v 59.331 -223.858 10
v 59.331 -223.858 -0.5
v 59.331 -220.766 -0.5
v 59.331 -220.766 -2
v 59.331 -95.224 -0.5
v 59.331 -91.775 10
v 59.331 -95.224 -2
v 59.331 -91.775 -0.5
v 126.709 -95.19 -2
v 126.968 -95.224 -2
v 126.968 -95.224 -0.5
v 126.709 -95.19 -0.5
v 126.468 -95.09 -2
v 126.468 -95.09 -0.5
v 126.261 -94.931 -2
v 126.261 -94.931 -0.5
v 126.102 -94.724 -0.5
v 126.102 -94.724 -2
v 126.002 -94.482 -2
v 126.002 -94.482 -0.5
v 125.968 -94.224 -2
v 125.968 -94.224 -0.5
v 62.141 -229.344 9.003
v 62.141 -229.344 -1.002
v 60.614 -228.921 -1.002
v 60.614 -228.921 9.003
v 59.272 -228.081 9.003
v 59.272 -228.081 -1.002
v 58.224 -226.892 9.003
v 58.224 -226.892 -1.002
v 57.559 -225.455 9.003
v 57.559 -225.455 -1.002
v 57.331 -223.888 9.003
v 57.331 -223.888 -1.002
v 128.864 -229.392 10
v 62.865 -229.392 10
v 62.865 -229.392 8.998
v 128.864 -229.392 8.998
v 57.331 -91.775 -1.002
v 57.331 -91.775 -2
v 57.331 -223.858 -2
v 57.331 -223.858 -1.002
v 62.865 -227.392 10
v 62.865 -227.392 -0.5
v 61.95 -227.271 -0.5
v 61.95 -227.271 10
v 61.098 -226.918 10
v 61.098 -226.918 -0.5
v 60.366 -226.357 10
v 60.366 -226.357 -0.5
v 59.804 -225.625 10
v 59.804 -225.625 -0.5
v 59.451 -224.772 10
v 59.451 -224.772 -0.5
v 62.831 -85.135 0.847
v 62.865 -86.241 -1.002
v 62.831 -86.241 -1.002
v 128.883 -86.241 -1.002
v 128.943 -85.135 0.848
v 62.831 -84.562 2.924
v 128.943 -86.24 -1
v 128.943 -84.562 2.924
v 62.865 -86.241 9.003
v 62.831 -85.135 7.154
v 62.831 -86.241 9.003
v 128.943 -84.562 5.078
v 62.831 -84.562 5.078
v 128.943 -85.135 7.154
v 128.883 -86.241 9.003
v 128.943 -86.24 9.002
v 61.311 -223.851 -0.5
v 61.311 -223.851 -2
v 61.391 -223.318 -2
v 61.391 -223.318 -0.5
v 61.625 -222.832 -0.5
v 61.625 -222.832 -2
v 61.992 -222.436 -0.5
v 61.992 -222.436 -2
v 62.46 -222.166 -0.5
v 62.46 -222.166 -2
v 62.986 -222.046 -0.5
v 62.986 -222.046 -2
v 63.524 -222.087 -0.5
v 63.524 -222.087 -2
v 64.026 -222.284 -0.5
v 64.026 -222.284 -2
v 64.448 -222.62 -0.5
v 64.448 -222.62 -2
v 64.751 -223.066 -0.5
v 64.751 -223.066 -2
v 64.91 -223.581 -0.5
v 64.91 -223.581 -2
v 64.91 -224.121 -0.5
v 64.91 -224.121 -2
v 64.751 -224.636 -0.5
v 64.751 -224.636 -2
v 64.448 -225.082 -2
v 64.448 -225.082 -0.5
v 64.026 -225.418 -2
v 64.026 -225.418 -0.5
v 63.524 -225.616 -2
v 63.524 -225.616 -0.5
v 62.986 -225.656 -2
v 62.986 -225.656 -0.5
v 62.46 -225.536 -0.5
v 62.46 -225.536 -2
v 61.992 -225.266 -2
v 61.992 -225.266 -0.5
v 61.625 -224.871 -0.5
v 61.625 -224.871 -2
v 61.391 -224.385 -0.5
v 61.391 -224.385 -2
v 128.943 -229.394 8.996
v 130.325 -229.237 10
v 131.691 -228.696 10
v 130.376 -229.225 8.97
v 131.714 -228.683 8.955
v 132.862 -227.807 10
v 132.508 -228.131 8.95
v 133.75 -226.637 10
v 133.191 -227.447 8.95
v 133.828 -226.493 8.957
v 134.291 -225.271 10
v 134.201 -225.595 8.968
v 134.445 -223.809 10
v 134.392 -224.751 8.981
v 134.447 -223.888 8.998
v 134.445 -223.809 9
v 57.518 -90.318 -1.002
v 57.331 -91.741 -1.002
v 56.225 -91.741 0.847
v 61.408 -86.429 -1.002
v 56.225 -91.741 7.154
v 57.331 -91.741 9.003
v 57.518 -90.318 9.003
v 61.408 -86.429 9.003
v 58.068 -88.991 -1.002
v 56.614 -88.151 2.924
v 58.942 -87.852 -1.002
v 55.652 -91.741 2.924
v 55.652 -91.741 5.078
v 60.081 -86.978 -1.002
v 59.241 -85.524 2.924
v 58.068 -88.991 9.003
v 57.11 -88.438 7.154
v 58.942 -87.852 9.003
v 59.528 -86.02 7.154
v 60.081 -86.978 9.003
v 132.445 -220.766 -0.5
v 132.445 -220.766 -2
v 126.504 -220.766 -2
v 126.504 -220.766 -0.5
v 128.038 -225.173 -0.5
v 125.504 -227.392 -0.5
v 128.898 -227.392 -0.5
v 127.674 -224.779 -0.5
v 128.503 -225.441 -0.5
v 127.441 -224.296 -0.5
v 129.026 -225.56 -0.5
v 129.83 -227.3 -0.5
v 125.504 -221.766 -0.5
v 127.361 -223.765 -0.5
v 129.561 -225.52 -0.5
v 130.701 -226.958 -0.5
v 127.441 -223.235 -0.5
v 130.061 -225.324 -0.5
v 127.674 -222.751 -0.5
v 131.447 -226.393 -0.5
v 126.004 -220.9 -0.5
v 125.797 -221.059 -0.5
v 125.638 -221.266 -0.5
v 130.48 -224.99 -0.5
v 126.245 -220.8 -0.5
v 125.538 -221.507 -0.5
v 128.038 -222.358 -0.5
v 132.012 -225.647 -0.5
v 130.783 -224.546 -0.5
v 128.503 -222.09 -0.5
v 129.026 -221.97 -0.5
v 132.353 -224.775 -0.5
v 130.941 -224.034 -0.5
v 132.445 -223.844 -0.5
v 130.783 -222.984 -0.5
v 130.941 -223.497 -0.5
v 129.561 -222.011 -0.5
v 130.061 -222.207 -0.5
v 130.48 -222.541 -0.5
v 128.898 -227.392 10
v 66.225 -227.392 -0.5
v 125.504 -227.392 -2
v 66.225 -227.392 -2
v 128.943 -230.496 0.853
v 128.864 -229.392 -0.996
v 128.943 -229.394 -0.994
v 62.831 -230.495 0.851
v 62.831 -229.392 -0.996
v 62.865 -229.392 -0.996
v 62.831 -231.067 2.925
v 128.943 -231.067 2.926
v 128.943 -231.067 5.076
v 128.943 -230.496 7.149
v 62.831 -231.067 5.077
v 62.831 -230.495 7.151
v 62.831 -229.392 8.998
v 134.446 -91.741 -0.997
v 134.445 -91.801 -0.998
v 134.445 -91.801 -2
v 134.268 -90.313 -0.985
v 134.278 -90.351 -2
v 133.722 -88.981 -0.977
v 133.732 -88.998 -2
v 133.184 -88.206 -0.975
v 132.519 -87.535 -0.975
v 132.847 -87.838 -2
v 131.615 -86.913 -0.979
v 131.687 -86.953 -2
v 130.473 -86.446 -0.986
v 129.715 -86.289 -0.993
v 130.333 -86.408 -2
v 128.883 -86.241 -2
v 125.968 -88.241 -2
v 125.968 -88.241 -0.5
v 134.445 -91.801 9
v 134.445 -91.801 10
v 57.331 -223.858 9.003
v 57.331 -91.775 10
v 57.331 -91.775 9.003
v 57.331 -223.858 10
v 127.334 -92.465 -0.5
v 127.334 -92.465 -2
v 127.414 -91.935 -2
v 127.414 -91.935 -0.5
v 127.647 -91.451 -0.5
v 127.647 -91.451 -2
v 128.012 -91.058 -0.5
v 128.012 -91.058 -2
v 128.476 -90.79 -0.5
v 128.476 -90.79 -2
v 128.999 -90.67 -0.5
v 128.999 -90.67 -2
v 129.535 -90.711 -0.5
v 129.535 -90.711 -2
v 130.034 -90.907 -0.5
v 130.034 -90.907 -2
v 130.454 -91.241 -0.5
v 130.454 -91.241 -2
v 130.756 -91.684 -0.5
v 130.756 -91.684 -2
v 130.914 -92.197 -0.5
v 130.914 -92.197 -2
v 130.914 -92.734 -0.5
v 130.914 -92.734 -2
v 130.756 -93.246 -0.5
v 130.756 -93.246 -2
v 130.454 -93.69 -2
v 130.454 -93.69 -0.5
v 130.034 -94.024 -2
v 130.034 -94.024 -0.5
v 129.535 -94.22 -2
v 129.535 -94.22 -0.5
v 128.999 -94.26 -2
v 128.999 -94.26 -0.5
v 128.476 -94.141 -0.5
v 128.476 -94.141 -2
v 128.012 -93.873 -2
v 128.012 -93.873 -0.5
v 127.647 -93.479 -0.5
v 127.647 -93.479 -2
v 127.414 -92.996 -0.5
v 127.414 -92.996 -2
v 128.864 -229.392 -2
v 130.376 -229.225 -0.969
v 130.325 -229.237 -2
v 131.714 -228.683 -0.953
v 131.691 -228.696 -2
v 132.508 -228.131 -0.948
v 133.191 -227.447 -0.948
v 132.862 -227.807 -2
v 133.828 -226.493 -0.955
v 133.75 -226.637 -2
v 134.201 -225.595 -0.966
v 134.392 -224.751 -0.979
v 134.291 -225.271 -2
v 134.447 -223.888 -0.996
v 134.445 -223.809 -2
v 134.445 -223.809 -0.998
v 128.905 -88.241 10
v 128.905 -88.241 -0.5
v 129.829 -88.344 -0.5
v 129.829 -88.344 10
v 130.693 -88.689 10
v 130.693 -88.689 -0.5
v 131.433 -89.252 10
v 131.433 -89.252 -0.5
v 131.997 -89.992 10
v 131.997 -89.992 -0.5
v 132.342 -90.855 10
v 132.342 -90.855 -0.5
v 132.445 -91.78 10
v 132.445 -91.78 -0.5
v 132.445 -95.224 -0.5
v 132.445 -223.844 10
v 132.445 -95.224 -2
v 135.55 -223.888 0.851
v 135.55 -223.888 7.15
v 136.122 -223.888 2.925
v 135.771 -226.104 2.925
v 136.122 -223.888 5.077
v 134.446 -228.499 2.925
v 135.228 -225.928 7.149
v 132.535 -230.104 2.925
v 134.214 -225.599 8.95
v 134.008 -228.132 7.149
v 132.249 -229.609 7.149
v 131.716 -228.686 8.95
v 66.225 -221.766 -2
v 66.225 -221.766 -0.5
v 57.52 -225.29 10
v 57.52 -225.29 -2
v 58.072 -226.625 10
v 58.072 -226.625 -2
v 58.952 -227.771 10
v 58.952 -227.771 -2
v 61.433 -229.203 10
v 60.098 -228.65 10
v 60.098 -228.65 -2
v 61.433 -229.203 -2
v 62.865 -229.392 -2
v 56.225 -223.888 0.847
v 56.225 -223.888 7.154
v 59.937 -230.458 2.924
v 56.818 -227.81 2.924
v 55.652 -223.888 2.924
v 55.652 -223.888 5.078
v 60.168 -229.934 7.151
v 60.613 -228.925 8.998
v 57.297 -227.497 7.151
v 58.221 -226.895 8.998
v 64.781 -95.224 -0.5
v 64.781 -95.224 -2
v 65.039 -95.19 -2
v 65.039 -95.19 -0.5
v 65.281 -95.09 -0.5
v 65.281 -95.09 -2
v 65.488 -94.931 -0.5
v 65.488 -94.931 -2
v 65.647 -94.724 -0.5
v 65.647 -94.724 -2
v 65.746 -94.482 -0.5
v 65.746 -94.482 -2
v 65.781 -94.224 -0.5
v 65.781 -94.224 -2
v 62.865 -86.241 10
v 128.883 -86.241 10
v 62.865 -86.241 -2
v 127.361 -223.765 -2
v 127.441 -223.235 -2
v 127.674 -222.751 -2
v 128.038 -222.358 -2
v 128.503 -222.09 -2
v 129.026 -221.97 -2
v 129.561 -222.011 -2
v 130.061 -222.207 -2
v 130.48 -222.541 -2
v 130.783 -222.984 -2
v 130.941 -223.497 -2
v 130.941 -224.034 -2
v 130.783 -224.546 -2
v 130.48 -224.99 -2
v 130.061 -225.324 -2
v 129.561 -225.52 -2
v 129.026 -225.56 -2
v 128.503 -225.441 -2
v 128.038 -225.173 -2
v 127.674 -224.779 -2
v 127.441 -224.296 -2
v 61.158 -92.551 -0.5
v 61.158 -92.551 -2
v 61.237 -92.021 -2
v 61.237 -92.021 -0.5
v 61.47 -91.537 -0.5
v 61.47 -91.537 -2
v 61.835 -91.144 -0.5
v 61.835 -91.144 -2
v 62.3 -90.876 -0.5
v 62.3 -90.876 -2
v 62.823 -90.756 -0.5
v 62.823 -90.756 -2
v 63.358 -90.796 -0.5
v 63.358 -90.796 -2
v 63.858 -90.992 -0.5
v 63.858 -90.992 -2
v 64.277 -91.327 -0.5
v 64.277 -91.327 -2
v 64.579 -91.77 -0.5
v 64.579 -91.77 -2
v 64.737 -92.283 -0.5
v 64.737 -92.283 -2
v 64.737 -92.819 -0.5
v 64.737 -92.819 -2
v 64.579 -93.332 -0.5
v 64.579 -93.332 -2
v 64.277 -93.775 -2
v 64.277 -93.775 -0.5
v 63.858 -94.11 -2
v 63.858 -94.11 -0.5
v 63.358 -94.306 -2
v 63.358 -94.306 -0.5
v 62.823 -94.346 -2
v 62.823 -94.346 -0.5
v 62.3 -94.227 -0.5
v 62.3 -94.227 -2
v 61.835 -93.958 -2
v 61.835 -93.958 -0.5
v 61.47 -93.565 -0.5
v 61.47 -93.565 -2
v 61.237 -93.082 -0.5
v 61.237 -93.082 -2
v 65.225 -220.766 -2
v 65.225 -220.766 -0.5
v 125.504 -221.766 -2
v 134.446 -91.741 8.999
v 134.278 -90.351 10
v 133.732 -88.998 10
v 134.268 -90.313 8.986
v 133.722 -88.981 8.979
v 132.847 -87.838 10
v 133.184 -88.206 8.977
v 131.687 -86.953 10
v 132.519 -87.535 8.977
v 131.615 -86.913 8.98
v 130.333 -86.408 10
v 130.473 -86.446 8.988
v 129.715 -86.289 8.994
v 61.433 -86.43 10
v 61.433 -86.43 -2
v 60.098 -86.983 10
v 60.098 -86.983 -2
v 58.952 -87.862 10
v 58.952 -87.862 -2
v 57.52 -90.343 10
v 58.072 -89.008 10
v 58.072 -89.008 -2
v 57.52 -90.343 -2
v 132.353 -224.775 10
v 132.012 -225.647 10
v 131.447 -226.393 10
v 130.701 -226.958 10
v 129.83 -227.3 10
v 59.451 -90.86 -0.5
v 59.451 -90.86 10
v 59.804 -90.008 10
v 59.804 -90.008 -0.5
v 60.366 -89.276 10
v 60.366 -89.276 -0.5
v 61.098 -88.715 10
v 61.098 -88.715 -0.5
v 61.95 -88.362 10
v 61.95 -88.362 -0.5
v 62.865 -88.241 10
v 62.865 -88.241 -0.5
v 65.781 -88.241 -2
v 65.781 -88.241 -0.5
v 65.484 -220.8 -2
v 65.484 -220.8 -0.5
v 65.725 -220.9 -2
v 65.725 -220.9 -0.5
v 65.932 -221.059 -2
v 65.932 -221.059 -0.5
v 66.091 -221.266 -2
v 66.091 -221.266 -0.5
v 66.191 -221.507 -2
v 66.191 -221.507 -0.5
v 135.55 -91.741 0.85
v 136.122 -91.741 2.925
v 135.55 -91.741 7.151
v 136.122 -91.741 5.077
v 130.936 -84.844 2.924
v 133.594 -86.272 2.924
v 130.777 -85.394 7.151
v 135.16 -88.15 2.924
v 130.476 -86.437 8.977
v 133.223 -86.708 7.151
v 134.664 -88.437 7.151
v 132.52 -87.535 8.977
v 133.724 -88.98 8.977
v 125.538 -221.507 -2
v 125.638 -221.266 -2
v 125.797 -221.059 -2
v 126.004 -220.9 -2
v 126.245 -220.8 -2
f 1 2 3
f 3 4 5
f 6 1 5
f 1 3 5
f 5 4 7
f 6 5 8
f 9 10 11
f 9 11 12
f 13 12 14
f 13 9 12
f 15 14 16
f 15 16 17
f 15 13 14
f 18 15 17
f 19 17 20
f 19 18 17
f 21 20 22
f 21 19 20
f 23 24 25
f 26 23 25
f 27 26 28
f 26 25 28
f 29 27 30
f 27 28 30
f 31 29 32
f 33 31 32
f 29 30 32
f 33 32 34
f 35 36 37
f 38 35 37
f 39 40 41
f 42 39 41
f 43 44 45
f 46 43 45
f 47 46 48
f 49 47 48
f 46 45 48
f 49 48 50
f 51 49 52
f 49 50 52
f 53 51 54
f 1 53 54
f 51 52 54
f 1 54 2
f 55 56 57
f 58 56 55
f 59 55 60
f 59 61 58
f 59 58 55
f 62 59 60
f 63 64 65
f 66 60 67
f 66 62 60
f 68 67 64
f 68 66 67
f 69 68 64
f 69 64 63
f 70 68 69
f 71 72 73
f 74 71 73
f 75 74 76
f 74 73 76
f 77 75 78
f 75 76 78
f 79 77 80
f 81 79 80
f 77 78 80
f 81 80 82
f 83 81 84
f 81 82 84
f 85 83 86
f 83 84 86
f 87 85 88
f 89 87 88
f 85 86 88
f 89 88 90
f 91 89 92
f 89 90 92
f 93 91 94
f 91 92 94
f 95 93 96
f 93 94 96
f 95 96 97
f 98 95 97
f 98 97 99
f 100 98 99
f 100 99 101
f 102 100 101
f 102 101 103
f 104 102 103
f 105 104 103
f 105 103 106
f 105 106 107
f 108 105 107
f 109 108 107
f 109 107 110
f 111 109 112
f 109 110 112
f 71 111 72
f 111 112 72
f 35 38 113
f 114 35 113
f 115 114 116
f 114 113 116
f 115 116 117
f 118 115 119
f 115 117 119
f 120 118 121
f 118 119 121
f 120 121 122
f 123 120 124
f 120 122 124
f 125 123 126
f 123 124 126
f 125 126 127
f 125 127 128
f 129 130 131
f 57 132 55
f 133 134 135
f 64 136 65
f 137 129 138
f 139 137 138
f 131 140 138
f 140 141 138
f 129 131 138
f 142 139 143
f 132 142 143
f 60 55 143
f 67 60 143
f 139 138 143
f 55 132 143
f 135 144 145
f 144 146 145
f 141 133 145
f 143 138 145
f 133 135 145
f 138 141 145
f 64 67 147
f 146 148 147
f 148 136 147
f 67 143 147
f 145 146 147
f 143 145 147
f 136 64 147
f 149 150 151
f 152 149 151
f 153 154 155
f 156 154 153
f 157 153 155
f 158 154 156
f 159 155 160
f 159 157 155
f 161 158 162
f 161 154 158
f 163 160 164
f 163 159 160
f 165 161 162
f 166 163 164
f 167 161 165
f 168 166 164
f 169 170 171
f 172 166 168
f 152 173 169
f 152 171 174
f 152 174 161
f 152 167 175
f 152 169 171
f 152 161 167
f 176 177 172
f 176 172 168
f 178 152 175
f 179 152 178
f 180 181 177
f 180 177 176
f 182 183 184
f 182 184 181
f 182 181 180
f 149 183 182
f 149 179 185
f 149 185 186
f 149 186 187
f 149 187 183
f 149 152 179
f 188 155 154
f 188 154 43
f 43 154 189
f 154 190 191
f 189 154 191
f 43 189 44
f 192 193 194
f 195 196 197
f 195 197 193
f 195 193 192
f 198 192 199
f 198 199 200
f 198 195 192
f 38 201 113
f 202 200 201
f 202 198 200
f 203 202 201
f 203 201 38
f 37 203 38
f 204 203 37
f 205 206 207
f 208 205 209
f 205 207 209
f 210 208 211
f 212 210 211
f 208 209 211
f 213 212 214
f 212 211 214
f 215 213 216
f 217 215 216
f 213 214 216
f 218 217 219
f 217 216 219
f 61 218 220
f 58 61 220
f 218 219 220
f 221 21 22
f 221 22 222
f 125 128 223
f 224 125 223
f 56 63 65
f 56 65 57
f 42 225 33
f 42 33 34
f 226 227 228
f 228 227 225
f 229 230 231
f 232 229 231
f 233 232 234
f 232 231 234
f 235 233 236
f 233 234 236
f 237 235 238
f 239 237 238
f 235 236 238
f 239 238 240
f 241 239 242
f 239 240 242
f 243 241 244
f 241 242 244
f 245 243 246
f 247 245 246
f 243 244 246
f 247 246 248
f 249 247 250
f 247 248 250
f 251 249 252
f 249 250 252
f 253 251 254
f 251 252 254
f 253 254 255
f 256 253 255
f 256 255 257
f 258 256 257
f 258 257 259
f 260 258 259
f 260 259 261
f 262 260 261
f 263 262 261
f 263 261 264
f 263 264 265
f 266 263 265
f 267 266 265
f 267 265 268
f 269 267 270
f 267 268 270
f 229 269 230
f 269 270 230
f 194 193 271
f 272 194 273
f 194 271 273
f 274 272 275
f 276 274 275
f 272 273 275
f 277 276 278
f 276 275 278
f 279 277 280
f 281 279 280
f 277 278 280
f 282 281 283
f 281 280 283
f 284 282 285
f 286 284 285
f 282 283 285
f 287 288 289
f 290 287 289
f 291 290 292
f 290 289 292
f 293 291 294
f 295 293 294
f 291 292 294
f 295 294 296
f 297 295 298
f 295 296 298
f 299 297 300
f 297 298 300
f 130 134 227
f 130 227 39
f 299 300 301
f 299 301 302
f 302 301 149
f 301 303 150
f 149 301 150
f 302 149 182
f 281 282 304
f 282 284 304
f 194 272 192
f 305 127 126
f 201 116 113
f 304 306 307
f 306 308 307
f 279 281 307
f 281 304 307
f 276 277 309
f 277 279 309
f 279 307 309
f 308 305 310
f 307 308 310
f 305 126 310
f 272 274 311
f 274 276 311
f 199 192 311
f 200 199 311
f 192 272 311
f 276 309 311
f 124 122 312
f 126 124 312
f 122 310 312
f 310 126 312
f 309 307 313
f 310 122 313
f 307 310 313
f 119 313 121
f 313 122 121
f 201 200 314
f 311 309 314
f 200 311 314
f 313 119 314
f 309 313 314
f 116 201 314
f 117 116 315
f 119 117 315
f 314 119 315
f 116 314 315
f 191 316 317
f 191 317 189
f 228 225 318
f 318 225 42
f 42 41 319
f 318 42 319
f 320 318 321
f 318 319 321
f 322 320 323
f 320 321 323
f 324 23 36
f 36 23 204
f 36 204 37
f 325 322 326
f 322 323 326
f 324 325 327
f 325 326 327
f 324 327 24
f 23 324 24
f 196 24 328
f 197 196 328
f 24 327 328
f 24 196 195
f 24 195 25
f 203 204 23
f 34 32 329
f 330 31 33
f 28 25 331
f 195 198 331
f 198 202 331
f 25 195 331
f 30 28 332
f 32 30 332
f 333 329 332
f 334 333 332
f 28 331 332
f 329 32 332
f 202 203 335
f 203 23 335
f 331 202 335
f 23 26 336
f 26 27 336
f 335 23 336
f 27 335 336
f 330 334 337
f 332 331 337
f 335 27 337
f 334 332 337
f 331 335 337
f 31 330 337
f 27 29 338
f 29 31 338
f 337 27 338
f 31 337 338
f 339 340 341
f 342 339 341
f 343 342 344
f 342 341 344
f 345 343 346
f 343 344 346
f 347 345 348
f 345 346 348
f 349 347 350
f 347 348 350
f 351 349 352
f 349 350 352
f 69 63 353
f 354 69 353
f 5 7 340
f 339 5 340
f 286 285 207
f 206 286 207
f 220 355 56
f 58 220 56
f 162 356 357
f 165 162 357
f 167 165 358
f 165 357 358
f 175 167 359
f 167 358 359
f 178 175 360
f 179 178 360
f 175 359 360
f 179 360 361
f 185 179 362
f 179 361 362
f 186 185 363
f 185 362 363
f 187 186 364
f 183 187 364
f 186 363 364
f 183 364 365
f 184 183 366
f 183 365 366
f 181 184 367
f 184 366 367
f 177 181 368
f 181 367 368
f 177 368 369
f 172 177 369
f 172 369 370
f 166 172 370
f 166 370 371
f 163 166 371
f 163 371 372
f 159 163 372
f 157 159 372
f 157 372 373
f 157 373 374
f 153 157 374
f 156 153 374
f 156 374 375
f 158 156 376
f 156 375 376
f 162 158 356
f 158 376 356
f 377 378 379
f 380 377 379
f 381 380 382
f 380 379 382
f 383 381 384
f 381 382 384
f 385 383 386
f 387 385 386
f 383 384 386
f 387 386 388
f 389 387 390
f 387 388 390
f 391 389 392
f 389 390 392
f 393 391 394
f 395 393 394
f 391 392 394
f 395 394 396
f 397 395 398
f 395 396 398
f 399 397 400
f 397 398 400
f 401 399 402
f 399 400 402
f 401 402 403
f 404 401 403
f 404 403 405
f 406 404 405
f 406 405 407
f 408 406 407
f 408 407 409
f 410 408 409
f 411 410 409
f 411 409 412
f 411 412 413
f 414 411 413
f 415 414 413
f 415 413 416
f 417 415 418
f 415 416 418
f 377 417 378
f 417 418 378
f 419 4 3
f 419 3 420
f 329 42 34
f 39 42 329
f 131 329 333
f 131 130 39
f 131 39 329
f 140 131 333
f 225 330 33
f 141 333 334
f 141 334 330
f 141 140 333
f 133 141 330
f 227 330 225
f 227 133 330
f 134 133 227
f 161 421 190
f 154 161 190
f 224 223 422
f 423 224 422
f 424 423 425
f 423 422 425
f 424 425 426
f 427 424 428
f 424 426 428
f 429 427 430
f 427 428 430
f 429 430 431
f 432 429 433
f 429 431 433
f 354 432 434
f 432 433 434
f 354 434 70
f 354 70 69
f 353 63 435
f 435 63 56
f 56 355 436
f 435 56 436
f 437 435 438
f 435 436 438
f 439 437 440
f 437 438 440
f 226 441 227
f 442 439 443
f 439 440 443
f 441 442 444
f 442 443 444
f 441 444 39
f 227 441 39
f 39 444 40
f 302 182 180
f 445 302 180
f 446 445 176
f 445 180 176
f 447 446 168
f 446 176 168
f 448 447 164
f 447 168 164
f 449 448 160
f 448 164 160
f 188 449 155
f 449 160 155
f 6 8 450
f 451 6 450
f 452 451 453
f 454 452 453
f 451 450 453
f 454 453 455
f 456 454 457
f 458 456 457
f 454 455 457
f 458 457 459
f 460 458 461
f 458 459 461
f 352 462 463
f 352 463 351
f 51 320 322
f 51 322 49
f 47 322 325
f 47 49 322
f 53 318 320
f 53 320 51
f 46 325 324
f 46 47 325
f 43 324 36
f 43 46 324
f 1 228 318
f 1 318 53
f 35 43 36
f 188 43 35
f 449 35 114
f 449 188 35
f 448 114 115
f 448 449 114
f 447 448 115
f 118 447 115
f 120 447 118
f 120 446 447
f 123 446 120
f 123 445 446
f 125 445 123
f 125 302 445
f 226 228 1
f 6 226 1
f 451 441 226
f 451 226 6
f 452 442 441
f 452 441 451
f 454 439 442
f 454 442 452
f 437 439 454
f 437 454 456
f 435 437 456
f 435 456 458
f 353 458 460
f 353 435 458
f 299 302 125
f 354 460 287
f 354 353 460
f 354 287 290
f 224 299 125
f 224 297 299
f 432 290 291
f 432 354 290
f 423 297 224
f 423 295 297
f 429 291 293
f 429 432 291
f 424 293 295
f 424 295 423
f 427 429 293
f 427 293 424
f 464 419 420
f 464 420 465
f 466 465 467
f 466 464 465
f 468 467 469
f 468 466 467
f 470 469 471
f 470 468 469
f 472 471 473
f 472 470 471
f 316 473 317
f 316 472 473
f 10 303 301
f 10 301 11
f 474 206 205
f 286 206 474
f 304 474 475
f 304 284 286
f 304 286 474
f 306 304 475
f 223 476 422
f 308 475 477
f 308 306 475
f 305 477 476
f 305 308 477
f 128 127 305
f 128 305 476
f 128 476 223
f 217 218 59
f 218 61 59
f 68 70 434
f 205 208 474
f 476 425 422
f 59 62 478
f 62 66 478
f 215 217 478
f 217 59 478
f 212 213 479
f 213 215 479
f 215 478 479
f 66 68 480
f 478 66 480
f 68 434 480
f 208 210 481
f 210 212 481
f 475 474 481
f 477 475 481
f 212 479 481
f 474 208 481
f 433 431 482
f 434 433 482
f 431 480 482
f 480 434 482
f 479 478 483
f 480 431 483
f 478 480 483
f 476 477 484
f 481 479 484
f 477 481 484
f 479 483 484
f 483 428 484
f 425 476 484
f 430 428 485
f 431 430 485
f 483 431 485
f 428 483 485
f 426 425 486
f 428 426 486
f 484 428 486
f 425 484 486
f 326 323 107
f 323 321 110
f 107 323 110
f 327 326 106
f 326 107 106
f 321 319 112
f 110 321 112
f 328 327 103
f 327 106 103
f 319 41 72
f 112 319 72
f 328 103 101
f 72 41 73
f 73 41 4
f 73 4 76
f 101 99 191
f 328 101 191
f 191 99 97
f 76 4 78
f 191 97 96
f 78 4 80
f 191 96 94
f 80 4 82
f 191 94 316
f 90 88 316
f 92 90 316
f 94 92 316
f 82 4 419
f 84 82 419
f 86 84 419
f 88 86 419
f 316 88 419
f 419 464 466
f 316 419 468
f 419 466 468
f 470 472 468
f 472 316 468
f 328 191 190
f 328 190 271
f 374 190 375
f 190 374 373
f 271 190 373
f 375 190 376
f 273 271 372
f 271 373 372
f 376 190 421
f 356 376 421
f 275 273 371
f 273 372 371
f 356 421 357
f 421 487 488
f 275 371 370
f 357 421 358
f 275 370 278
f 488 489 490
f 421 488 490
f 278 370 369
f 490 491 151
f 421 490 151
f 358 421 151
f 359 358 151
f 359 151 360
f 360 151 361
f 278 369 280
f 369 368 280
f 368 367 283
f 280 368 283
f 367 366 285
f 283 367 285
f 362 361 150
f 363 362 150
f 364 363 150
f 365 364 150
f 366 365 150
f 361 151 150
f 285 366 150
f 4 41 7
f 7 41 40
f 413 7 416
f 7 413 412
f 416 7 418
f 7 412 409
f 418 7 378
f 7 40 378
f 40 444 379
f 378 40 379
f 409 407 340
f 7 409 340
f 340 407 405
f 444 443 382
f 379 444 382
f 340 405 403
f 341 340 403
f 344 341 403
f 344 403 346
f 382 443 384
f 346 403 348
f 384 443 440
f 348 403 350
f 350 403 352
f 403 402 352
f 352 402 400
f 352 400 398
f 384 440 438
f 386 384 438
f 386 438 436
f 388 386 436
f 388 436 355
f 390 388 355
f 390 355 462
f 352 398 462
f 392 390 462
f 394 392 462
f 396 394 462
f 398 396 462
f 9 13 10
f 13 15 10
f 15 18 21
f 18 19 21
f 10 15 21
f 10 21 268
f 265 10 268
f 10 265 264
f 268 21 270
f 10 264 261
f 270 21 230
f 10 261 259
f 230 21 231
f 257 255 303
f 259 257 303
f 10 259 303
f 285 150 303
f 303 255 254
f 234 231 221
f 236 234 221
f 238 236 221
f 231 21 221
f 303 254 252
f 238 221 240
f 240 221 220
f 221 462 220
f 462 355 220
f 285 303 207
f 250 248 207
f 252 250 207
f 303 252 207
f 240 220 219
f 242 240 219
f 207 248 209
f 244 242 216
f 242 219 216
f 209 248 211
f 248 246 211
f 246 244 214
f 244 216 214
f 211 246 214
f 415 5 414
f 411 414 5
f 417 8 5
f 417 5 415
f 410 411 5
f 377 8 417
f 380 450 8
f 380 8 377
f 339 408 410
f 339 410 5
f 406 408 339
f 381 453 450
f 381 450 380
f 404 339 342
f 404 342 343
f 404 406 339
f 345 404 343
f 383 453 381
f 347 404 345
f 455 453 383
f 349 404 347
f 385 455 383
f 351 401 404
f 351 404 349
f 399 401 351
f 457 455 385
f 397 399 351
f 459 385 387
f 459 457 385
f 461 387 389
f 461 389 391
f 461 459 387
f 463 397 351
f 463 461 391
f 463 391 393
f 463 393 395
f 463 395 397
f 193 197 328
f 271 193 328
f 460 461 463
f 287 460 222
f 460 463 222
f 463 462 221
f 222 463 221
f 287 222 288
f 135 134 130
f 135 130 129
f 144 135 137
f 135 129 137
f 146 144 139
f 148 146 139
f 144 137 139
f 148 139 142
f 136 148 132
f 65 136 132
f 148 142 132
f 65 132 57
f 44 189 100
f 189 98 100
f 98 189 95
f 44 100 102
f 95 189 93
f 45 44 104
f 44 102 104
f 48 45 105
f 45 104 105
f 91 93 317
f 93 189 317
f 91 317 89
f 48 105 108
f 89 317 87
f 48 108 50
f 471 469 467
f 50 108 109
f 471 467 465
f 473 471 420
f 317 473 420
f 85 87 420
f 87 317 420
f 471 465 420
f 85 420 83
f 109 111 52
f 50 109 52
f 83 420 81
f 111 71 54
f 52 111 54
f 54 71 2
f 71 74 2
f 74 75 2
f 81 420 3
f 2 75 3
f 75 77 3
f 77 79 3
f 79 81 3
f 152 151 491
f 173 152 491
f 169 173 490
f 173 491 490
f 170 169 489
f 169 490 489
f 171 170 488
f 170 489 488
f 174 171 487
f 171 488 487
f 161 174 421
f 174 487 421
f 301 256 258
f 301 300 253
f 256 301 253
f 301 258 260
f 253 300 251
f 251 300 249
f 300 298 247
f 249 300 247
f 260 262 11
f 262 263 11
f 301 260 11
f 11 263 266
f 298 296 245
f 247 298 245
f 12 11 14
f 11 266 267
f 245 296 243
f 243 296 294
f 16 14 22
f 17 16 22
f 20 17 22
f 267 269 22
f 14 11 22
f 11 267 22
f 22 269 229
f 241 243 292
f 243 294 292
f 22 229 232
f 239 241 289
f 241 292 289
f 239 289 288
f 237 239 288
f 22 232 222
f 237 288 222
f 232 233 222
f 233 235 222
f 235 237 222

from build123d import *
from build123d.topology import SkipClean

# Parameters (mm, degrees)
BOSS_EXTRU_1_DEPTH      = 10
COQUE3_START            = 62.865
COQUE3_OUTLINE_W        = 139.150614233
COQUE3_OUTLINE_H        = 10
COQUE3_DEPTH            = 66.018297978
COQUE3_2_DEPTH          = 66.018297978
COQUE3_START_2          = 132.445419336
COQUE3_3_OUTLINE_W      = 139.150614233
COQUE3_3_OUTLINE_H      = 10
COQUE3_3_DEPTH          = 0.002588282
COQUE3_4_DEPTH          = 10
COQUE3_START_3          = -2
COQUE3_5_DEPTH          = 12
COQUE3_6_DEPTH          = 2
ENL_V_START             = -10
ENL_V_MAT_EXTRU_4_DEPTH = 10
ESQUISSE5_R             = 1.8
BOSS_EXTRU_2_DEPTH      = 1.5
ESQUISSE6_R             = 1.8
ESQUISSE6_R_2           = 1.809836942
BOSS_EXTRU_3_DEPTH      = 1.5


with BuildPart() as part:
    # Model → Boss.-Extru.1 (new body)
    with BuildSketch(Plane.XY):
        with BuildLine():
            Line((62.865, -88.241118767), (128.905, -88.241118767))
            ThreePointArc((128.905, -88.241118767), (131.433274754, -89.251885129), (132.445419336, -91.779608456))
            Line((132.445419336, -91.779608456), (132.445419336, -223.843779))
            ThreePointArc((132.445419336, -223.843779), (131.447277728, -226.393080044), (128.898176953, -227.391733))
            Line((128.898176953, -227.391733), (62.865, -227.391733))
            ThreePointArc((62.865, -227.391733), (60.366111032, -226.356659298), (59.33103733, -223.85777033))
            Line((59.33103733, -223.85777033), (59.33103733, -91.775081437))
            ThreePointArc((59.33103733, -91.775081437), (60.366111032, -89.276192468), (62.865, -88.241118767))
        make_face()
    extrude(amount=BOSS_EXTRU_1_DEPTH)

    # Coque3: read off the stored shape, not the designer's step
    # Coque3 outline → Coque3 (cut)
    with BuildSketch(Plane.YZ.offset(COQUE3_START)):
        with Locations((-157.816425884, 5)):
            Rectangle(COQUE3_OUTLINE_W, COQUE3_OUTLINE_H)
    extrude(amount=COQUE3_DEPTH, mode=Mode.SUBTRACT)

    # Coque3 2 outline → Coque3 2 (add)
    with BuildSketch(Plane.YZ.offset(COQUE3_START)):
        Polygon((-227.391733, 10), (-229.391733, 10), (-229.391733, -2), (-86.241118767, -2), (-86.241118767, 10), (-88.241118767, 10), (-88.241118767, 0), (-227.391733, 0), align=None)
    extrude(amount=COQUE3_2_DEPTH)

    # Coque3 3 outline → Coque3 3 (add)
    with BuildSketch(Plane.YZ.offset(COQUE3_START_2)):
        with Locations((-157.816425884, 5)):
            Rectangle(COQUE3_3_OUTLINE_W, COQUE3_3_OUTLINE_H)
    extrude(amount=COQUE3_3_DEPTH)

    # Coque3 4 outline → Coque3 4 (cut)
    with BuildSketch(Plane.XY):
        with BuildLine():
            Line((62.865, -227.391733), (62.865, -88.241118767))
            ThreePointArc((62.865, -88.241118767), (60.366111032, -89.276192468), (59.33103733, -91.775081437))
            Line((59.33103733, -91.775081437), (59.33103733, -223.85777033))
            ThreePointArc((59.33103733, -223.85777033), (60.366111032, -226.356659298), (62.865, -227.391733))
        make_face()
        with BuildLine():
            Line((128.905, -88.241118767), (128.883297978, -88.241118767))
            Line((128.883297978, -88.241118767), (128.883297978, -227.391733))
            Line((128.883297978, -227.391733), (128.898176953, -227.391733))
            ThreePointArc((128.898176953, -227.391733), (131.447277728, -226.393080044), (132.445419336, -223.843779))
            Line((132.445419336, -223.843779), (132.445419336, -91.779608456))
            ThreePointArc((132.445419336, -91.779608456), (131.433274754, -89.251885129), (128.905, -88.241118767))
        make_face()
    extrude(amount=COQUE3_4_DEPTH, mode=Mode.SUBTRACT)

    # Coque3 5 outline → Coque3 5 (add)
    with SkipClean():  # the faces are left unmerged after this step: merging them gives an invalid solid
        with BuildSketch(Plane.XY.offset(COQUE3_START_3)):
            with BuildLine():
                ThreePointArc((62.865, -86.241118767), (58.951897469, -87.861978906), (57.33103733, -91.775081437))
                Line((57.33103733, -91.775081437), (57.33103733, -223.85777033))
                ThreePointArc((57.33103733, -223.85777033), (58.951897469, -227.770872861), (62.865, -229.391733))
                Line((62.865, -229.391733), (62.865, -227.391733))
                ThreePointArc((62.865, -227.391733), (60.366111032, -226.356659298), (59.33103733, -223.85777033))
                Line((59.33103733, -223.85777033), (59.33103733, -91.775081437))
                ThreePointArc((59.33103733, -91.775081437), (60.366111032, -89.276192468), (62.865, -88.241118767))
                Line((62.865, -88.241118767), (62.865, -86.241118767))
            make_face()
            with BuildLine():
                Line((128.883297978, -86.241118767), (128.883297978, -88.241118767))
                Line((128.883297978, -88.241118767), (128.905, -88.241118767))
                ThreePointArc((128.905, -88.241118767), (131.433274754, -89.251885129), (132.445419336, -91.779608456))
                Line((132.445419336, -91.779608456), (132.445419336, -223.843779))
                ThreePointArc((132.445419336, -223.843779), (131.447277728, -226.393080044), (128.898176953, -227.391733))
                Line((128.898176953, -227.391733), (128.883297978, -227.391733))
                Line((128.883297978, -227.391733), (128.883297978, -229.391733))
                Line((128.883297978, -229.391733), (128.863893168, -229.391733))
                ThreePointArc((128.863893168, -229.391733), (132.861554056, -227.807230841), (134.445419336, -223.80931758))
                Line((134.445419336, -223.80931758), (134.445419336, -91.8008272))
                ThreePointArc((134.445419336, -91.8008272), (132.847317492, -87.837500742), (128.883297978, -86.241118767))
            make_face()
        extrude(amount=COQUE3_5_DEPTH)
    add(part.part.scale(1), mode=Mode.REPLACE)  # the faces are merged on a copy

    # Coque3 6 outline → Coque3 6 (add)
    with BuildSketch(Plane.XY.offset(COQUE3_START_3)):
        with BuildLine():
            Line((62.865, -227.391733), (62.865, -88.241118767))
            ThreePointArc((62.865, -88.241118767), (60.366111032, -89.276192468), (59.33103733, -91.775081437))
            Line((59.33103733, -91.775081437), (59.33103733, -223.85777033))
            ThreePointArc((59.33103733, -223.85777033), (60.366111032, -226.356659298), (62.865, -227.391733))
        make_face()
        with BuildLine():
            Line((128.905, -88.241118767), (128.883297978, -88.241118767))
            Line((128.883297978, -88.241118767), (128.883297978, -227.391733))
            Line((128.883297978, -227.391733), (128.898176953, -227.391733))
            ThreePointArc((128.898176953, -227.391733), (131.447277728, -226.393080044), (132.445419336, -223.843779))
            Line((132.445419336, -223.843779), (132.445419336, -91.779608456))
            ThreePointArc((132.445419336, -91.779608456), (131.433274754, -89.251885129), (128.905, -88.241118767))
        make_face()
    extrude(amount=COQUE3_6_DEPTH)

    # Esquisse3 → Enlèv. mat.-Extru.4 (cut)
    with BuildSketch(Plane.XY.offset(ENL_V_START)):
        with BuildLine():
            Line((62.865, -88.241118767), (128.905, -88.241118767))
            ThreePointArc((128.905, -88.241118767), (131.433274754, -89.251885129), (132.445419336, -91.779608456))
            Line((132.445419336, -91.779608456), (132.445419336, -223.843779))
            ThreePointArc((132.445419336, -223.843779), (131.447277728, -226.393080044), (128.898176953, -227.391733))
            Line((128.898176953, -227.391733), (62.865, -227.391733))
            ThreePointArc((62.865, -227.391733), (60.366111032, -226.356659298), (59.33103733, -223.85777033))
            Line((59.33103733, -223.85777033), (59.33103733, -91.775081437))
            ThreePointArc((59.33103733, -91.775081437), (60.366111032, -89.276192468), (62.865, -88.241118767))
        make_face()
    extrude(amount=ENL_V_MAT_EXTRU_4_DEPTH, mode=Mode.SUBTRACT)

    # Esquisse5 → Boss.-Extru.2 (add)
    # profile 1 of 2: a face of its own
    with SkipClean():  # the faces are left unmerged after this step: merging them gives an invalid solid
        with BuildSketch(Plane(origin=(0, 0, -2), x_dir=(-1, 0, 0), z_dir=(0, 0, -1))):
            with BuildLine():
                Line((-125.967795303, -88.736416121), (-125.967795303, -87.927030419))
                Line((-125.967795303, -87.927030419), (-130.489542498, -87.7228715))
                Line((-130.489542498, -87.7228715), (-132.246258772, -88.33172327))
                Line((-132.246258772, -88.33172327), (-132.913956121, -88.736416121))
                Line((-132.913956121, -88.736416121), (-132.913956121, -95.223579528))
                Line((-132.913956121, -95.223579528), (-126.967795303, -95.223579528))
                ThreePointArc((-126.967795303, -95.223579528), (-126.260688522, -94.93068631), (-125.967795303, -94.223579528))
                Line((-125.967795303, -94.223579528), (-125.967795303, -88.736416121))
            make_face()
            with Locations((-129.134006805, -92.465411844)):
                Circle(ESQUISSE5_R, mode=Mode.SUBTRACT)
        # profile 2 of 2: a face of its own
        with BuildSketch(Plane(origin=(0, 0, -2), x_dir=(-1, 0, 0), z_dir=(0, 0, -1))):
            with BuildLine():
                Line((-65.780502675, -88.736416121), (-65.780502675, -87.927030419))
                Line((-65.780502675, -87.927030419), (-61.258755481, -87.7228715))
                Line((-61.258755481, -87.7228715), (-59.502039206, -88.33172327))
                Line((-59.502039206, -88.33172327), (-58.834341857, -88.736416121))
                Line((-58.834341857, -88.736416121), (-58.834341857, -95.223579528))
                Line((-58.834341857, -95.223579528), (-64.780502675, -95.223579528))
                ThreePointArc((-64.780502675, -95.223579528), (-65.487609456, -94.93068631), (-65.780502675, -94.223579528))
                Line((-65.780502675, -94.223579528), (-65.780502675, -88.736416121))
            make_face()
            with Locations((-62.957500414, -92.551168532)):
                Circle(ESQUISSE5_R, mode=Mode.SUBTRACT)
        extrude(amount=-BOSS_EXTRU_2_DEPTH)

    # Esquisse6 → Boss.-Extru.3 (add)
    # profile 1 of 2: a face of its own
    with BuildSketch(Plane(origin=(0, 0, -2), x_dir=(-1, 0, 0), z_dir=(0, 0, -1))):
        with BuildLine():
            Line((-133.339427004, -220.765848966), (-126.504202764, -220.765848966))
            ThreePointArc((-126.504202764, -220.765848966), (-125.797095983, -221.058742184), (-125.504202764, -221.765848966))
            Line((-125.504202764, -221.765848966), (-125.504202764, -228.064085465))
            Line((-125.504202764, -228.064085465), (-130.16804847, -228.064085465))
            Line((-130.16804847, -228.064085465), (-131.733408387, -227.250911482))
            Line((-131.733408387, -227.250911482), (-133.339427004, -225.177317824))
            Line((-133.339427004, -225.177317824), (-133.339427004, -220.765848966))
        make_face()
        with Locations((-129.160770539, -223.765453407)):
            Circle(ESQUISSE6_R, mode=Mode.SUBTRACT)
    # profile 2 of 2: a face of its own
    with BuildSketch(Plane(origin=(0, 0, -2), x_dir=(-1, 0, 0), z_dir=(0, 0, -1))):
        with BuildLine():
            Line((-58.389466164, -225.177317824), (-58.389466164, -220.765848966))
            Line((-58.389466164, -220.765848966), (-65.224690404, -220.765848966))
            ThreePointArc((-65.224690404, -220.765848966), (-65.931797185, -221.058742184), (-66.224690404, -221.765848966))
            Line((-66.224690404, -221.765848966), (-66.224690404, -228.064085465))
            Line((-66.224690404, -228.064085465), (-61.560844698, -228.064085465))
            Line((-61.560844698, -228.064085465), (-59.995484781, -227.250911482))
            Line((-59.995484781, -227.250911482), (-58.389466164, -225.177317824))
        make_face()
        with Locations((-63.12082636, -223.851047054)):
            Circle(ESQUISSE6_R_2, mode=Mode.SUBTRACT)
    extrude(amount=-BOSS_EXTRU_3_DEPTH)

    # Balayage1: sweep along a path in Esquisse7
    with BuildLine(Plane.XY.offset(5)) as balayage1_path:
        Line((128.942747104, -230.887624532), (62.83103733, -230.887624532))
        ThreePointArc((62.83103733, -230.887624532), (57.881289862, -228.837372001), (55.83103733, -223.887624532))
        Line((55.83103733, -223.887624532), (55.83103733, -91.741118767))
        ThreePointArc((55.83103733, -91.741118767), (57.881289862, -86.791371299), (62.83103733, -84.741118767))
        Line((62.83103733, -84.741118767), (128.942747104, -84.741118767))
        ThreePointArc((128.942747104, -84.741118767), (133.892494572, -86.791371299), (135.942747104, -91.741118767))
        Line((135.942747104, -91.741118767), (135.942747104, -223.887624532))
        ThreePointArc((135.942747104, -223.887624532), (133.892494572, -228.837372001), (128.942747104, -230.887624532))
    # Esquisse8 → Balayage1 (sweep)
    with BuildSketch(Plane(origin=(0, -155, 0), x_dir=(1, 0, 0), z_dir=(0, 1, 0))):
        with BuildLine():
            Line((57.33103733, 1.001505866), (57.33103733, -9.003220236))
            ThreePointArc((57.33103733, -9.003220236), (55.579057649, -4.000857185), (57.33103733, 1.001505866))
        make_face()
    sweep(path=balayage1_path.line)


solid = part.part
